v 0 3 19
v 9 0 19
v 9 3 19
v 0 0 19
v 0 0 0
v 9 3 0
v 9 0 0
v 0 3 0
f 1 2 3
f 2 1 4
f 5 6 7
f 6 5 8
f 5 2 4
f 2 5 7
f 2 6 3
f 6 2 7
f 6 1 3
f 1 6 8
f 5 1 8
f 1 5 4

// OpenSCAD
// Generated by SolidPython 1.0.1 on 2020-07-29 00:46:55


cube(size = [9, 3, 19]);
/***********************************************
*********      SolidPython code:      **********
************************************************
 
# import packages: SolidPython
from solid import *
from solid.utils import *
from itertools import chain, combinations, permutations


class Resize:

    def __init__(self, scad_file):
        self.scad_file = scad_file
        #self.scad_file = import_scad(scad_file)
        # cone/cylinder param:
        self.r1 = 0
        self.r2 = 0
        self.h = 0
        # rectangular prism param:
        self.w = 0
        self.l = 0
        # ellipse param:
        self.r = 0

    # import OpenScad code (file name corresponds to shape)


    # classify shape + parameters
    def assign(self, param1, param2, param3):
        if self.scad_file == 'cone.scad':
            self.r1 = param1
            self.r2 = param2
            self.h = param3
        elif self.scad_file == 'cylinder.scad':
            self.r1 = param1
            self.r2 = param2
            self.h = param3
        elif self.scad_file == 'rectangularPrism.scad':
            self.h = param1
            self.l = param2
            self.w = param3
        else:
            self.r = param1
            self.h = param2

    # resize parameters
    def iterate(self):
        x = range(3, 20, 2)
        i = 1
        if self.scad_file == 'cone.scad':
            tempList = list(permutations(x, 2))
            for temp in tempList:
                param1 = temp[0]
                param2 = temp[1]
                filepath = 'produced_scad_files/' + 'cone' + str(param1) + '_' + str(param2) + '_' + '.scad'
                scad_render_to_file(cylinder(h=param1, r1=param2, r2=0), filepath)

        elif self.scad_file == 'cylinder.scad':
            tempList = list(permutations(x, 3))
            for temp in tempList:
                param1 = temp[0]
                param2 = temp[1]
                filepath = 'produced_scad_files/' + 'cylinder' + str(param1) + '_' + str(param2) + '_' + '.scad'
                scad_render_to_file(cylinder(h=param1, r1=param2, r2=param2), filepath)

        elif self.scad_file == 'rectangularPrism.scad':
            tempList = list(permutations(x, 3))
            for temp in tempList:
                param1 = temp[0]
                param2 = temp[1]
                param3 = temp[2]
                filepath = 'produced_scad_files/' + 'rectangularPrism' + str(param1) + '_' + str(param2) + '_' + str(
                    param3) + '.scad'
                scad_render_to_file(cube(size=(param1, param2, param3)), filepath)

        elif self.scad_file == 'ellipse.scad':
            tempList = list(permutations(x, 4))
            for temp in tempList:
                param1 = temp[0]
                param2 = temp[1]
                param3 = temp[2]
                param4 = temp[3]
                filepath = 'produced_scad_files/' + 'ellipse' + str(param1) + '_' + str(param2) + '_' + str(param3) + '_' + str(param4) + '.scad'
                scad_render_to_file(scale([param1, param2, param3])(sphere(r=param4)), filepath)

    def render_to_scadfile(self):
        scad_render_to_file(scad, 'example.scad') 
 
************************************************/
